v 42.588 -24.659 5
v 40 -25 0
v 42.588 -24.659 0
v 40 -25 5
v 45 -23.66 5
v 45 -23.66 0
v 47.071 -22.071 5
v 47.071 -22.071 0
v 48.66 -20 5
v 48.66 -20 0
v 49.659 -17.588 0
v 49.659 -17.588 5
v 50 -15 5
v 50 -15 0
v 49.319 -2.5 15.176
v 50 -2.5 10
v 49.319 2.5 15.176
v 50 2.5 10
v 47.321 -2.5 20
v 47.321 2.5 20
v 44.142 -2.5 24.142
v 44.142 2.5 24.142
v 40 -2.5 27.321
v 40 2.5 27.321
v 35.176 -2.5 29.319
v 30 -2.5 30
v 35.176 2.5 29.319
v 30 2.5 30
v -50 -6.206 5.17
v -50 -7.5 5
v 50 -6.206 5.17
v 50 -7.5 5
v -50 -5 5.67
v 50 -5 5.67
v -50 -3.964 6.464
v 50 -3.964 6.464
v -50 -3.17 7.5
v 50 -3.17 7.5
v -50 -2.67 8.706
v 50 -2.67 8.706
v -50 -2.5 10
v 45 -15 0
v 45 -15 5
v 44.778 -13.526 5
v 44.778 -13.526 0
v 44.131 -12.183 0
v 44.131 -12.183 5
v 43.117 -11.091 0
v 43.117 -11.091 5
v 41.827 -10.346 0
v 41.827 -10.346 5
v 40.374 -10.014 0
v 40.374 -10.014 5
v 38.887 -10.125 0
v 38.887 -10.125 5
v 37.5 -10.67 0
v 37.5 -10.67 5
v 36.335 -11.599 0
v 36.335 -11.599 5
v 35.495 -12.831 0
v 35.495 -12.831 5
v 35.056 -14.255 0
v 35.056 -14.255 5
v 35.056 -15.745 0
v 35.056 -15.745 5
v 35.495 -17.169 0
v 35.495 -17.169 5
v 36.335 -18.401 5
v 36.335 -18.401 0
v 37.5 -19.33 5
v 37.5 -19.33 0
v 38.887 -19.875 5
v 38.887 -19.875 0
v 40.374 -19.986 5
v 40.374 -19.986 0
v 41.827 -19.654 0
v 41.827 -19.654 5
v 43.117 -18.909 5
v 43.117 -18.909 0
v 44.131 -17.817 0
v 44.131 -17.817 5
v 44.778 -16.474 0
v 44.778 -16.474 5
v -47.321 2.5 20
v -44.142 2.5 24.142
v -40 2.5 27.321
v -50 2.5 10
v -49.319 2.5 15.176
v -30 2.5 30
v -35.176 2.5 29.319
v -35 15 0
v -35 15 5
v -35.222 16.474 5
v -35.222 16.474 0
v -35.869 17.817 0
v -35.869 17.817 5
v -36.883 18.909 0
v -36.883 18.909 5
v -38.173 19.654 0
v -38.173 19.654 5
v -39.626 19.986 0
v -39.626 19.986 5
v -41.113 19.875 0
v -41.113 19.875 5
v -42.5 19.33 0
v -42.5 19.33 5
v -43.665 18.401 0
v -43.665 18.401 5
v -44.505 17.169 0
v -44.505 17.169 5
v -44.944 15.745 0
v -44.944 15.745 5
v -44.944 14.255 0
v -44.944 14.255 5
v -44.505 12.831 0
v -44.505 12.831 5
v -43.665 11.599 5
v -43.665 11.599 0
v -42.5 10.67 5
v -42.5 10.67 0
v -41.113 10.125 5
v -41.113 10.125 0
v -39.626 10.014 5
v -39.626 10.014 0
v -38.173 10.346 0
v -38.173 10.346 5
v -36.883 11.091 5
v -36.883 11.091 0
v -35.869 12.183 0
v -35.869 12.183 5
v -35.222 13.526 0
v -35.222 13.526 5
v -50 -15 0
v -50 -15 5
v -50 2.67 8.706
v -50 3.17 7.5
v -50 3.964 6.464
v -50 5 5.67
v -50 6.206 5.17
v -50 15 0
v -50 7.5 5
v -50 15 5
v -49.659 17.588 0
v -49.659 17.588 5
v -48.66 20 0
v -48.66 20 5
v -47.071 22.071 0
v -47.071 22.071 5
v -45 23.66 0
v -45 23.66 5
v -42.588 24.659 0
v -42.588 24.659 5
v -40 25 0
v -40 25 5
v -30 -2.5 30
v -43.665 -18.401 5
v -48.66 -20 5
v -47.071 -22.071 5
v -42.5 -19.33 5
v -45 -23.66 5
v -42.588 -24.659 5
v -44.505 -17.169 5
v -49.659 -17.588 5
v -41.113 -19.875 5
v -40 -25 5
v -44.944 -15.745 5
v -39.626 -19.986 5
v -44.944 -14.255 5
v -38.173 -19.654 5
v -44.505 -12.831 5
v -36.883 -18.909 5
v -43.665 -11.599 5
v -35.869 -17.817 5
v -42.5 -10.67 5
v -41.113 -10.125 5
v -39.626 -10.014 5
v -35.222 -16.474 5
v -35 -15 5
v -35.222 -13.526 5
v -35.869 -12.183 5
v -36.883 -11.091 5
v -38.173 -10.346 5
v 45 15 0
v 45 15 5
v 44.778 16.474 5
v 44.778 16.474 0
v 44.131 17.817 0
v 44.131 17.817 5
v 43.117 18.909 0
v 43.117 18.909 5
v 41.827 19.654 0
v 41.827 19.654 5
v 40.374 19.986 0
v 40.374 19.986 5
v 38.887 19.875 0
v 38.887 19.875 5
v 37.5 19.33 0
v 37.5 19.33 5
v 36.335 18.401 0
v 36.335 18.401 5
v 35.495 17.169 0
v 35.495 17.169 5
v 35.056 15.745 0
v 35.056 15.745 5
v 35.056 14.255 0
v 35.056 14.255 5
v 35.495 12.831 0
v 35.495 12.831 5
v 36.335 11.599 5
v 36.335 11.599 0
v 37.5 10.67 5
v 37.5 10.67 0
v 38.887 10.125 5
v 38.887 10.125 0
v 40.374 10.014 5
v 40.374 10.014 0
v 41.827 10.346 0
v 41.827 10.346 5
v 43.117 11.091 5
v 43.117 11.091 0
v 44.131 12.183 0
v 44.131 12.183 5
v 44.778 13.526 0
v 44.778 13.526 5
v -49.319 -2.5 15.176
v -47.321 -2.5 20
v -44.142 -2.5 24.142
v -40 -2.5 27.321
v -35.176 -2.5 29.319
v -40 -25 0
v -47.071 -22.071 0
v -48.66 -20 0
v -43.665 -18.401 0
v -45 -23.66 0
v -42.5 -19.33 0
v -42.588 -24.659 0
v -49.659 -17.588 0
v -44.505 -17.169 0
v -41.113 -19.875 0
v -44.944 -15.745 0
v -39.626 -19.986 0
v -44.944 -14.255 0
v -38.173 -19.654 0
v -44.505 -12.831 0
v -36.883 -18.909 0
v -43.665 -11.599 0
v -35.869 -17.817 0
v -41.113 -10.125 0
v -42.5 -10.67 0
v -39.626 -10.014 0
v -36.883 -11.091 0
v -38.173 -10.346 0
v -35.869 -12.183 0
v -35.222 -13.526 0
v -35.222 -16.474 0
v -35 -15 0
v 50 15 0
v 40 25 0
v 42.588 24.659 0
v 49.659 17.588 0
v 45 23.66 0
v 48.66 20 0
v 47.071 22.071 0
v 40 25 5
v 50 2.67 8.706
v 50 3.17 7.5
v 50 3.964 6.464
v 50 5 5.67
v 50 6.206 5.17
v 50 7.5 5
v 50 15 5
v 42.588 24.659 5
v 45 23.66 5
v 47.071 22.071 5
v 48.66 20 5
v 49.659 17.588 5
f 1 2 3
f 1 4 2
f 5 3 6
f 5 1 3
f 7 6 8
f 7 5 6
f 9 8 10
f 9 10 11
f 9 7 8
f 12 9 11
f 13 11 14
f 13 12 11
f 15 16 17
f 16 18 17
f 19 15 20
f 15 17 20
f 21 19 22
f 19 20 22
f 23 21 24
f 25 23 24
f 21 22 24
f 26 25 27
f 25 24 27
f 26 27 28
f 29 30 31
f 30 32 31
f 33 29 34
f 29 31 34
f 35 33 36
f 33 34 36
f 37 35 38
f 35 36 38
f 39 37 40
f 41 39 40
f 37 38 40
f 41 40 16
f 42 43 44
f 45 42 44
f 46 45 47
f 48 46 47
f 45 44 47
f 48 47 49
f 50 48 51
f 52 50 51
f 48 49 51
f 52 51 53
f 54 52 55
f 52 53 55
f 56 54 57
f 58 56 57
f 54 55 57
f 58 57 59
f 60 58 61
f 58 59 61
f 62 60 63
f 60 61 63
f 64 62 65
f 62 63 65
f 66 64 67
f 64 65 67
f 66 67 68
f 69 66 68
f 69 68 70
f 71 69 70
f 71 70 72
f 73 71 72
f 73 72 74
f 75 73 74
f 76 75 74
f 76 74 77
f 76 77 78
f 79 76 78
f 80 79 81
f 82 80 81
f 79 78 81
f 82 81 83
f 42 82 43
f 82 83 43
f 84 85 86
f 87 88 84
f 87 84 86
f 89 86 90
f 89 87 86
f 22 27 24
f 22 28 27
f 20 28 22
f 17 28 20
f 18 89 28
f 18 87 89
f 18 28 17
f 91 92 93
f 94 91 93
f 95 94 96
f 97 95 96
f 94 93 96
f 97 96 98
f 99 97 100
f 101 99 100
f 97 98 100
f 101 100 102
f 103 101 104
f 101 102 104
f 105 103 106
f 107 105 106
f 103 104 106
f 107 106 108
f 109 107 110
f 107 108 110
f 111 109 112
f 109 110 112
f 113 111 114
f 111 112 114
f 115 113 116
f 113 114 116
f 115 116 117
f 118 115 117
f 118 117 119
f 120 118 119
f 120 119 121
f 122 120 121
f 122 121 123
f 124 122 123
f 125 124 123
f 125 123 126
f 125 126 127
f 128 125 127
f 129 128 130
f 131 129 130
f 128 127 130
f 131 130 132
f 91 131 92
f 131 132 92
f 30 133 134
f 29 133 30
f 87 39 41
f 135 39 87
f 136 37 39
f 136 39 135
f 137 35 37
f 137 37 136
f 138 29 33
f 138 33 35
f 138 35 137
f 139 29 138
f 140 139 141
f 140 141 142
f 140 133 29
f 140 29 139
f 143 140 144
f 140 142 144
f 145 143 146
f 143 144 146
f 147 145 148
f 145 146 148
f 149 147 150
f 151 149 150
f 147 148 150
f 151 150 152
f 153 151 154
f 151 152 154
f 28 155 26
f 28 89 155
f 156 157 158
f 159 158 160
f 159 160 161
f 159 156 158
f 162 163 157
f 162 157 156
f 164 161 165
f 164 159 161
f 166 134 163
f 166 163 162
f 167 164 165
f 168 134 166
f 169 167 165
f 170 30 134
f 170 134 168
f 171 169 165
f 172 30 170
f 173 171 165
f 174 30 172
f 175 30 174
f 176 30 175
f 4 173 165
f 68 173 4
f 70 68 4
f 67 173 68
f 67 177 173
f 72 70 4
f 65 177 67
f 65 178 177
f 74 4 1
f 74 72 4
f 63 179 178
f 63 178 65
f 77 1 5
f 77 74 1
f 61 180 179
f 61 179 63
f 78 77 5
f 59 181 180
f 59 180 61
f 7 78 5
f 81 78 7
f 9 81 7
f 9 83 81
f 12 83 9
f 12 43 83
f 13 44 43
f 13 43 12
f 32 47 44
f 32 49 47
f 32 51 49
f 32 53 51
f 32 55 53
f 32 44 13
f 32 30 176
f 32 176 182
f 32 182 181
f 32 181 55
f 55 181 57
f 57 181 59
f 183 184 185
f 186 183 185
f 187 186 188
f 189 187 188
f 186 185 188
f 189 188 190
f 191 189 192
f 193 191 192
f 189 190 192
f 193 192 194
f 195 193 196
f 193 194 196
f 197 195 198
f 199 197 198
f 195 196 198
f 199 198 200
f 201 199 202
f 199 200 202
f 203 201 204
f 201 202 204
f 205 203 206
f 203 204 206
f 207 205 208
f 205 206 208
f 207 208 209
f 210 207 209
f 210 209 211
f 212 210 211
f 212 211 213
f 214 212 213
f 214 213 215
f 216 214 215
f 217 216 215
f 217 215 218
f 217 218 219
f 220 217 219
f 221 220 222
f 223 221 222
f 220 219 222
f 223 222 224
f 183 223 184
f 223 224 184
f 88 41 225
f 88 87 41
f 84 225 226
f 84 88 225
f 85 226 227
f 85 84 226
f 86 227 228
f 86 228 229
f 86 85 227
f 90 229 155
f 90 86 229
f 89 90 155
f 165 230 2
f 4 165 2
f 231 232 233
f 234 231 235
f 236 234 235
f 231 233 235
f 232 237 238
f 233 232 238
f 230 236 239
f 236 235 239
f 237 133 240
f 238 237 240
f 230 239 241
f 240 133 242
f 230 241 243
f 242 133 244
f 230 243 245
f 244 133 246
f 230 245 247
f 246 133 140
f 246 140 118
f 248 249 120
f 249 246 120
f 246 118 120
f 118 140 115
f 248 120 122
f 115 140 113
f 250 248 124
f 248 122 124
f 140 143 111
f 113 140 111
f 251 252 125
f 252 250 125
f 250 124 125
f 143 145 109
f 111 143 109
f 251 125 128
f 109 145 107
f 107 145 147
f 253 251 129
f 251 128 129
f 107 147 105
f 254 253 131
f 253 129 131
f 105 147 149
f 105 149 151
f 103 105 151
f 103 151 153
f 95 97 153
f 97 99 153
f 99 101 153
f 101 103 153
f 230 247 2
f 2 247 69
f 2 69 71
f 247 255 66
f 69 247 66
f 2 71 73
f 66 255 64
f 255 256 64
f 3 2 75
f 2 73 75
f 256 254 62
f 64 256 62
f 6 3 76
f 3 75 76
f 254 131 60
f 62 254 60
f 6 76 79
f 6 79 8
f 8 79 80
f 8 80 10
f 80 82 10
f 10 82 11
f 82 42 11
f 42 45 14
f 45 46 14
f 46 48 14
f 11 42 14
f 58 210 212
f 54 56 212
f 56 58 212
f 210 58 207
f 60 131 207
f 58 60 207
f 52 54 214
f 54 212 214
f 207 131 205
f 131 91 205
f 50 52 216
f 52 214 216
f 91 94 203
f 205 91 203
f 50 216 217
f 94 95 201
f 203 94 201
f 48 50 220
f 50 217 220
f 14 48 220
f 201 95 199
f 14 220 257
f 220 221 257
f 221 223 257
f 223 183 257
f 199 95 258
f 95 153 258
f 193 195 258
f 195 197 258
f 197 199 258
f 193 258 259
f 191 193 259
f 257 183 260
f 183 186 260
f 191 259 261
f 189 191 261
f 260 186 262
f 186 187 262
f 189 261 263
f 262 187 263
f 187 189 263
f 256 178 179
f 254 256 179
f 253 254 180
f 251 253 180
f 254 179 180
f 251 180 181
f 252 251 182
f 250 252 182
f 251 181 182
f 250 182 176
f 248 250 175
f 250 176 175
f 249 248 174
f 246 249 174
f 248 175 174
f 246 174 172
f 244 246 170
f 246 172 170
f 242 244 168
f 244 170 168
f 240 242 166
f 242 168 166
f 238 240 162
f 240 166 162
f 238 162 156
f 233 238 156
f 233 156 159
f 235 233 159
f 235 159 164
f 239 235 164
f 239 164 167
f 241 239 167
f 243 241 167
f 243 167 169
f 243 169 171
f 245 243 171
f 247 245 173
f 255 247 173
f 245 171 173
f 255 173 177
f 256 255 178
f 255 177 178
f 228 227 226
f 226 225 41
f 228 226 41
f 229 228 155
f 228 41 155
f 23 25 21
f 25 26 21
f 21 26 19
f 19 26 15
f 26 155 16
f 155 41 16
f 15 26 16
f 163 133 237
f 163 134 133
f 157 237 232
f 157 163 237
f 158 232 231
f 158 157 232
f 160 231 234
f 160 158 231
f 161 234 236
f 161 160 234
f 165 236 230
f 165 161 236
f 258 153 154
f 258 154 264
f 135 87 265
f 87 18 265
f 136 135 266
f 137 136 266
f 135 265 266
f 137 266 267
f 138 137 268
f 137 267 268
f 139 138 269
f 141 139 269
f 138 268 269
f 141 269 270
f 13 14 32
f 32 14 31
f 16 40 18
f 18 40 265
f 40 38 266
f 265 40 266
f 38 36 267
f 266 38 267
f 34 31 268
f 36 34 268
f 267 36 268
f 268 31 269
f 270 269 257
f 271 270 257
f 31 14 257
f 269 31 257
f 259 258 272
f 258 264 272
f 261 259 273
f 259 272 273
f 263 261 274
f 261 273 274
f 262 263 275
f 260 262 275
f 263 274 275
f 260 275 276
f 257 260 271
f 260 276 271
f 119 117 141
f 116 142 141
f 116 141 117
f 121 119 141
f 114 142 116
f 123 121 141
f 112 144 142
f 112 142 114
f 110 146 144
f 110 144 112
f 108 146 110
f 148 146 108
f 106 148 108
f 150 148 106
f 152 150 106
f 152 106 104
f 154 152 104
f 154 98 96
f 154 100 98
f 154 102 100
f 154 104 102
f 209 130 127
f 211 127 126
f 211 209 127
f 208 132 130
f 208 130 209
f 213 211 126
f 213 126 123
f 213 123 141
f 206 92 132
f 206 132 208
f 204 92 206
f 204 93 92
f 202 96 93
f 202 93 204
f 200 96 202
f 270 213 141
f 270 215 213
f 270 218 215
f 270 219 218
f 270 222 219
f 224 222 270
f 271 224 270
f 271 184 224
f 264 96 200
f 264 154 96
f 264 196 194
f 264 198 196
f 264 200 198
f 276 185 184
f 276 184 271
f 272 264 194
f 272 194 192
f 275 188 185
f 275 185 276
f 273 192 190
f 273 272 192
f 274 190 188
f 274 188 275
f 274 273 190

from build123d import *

# Parameters (mm, degrees)
SKETCH_W     = 100
SKETCH_H     = 50
PAD_DEPTH    = 5
SKETCH001_R  = 5
POCKET_DEPTH = 5
SKETCH002_W  = 100
SKETCH002_H  = 5
PAD001_DEPTH = 25
FILLET_R     = 20
FILLET001_R  = 10
FILLET002_R  = 5


with BuildPart() as part:
    # Sketch → Pad (new body)
    with BuildSketch(Plane.XY):
        Rectangle(SKETCH_W, SKETCH_H)
    extrude(amount=PAD_DEPTH)

    # Sketch001 (on Face6 of Pad) → Pocket (cut)
    with BuildSketch(Plane.XY.offset(5)):
        with Locations((40, 15)):
            Circle(SKETCH001_R)
        with Locations((40, -15)):
            Circle(SKETCH001_R)
        with Locations((-40, 15)):
            Circle(SKETCH001_R)
        with Locations((-40, -15)):
            Circle(SKETCH001_R)
    extrude(amount=-POCKET_DEPTH, mode=Mode.SUBTRACT)

    # Sketch002 (on Face5 of Pocket) → Pad001 (join)
    with BuildSketch(Plane.XY.offset(5)):
        Rectangle(SKETCH002_W, SKETCH002_H)
    extrude(amount=PAD001_DEPTH)

    # Fillet
    fillet_edges = [part.edges().sort_by_distance(p)[0] for p in [
        (50, 0, 30),
        (-50, 0, 30),
    ]]
    fillet(fillet_edges, radius=FILLET_R)

    # Fillet001
    fillet001_edges = [part.edges().sort_by_distance(p)[0] for p in [
        (50, -25, 2.5),
        (-50, -25, 2.5),
        (-50, 25, 2.5),
        (50, 25, 2.5),
    ]]
    fillet(fillet001_edges, radius=FILLET001_R)

    # Fillet002
    fillet002_edges = [part.edges().sort_by_distance(p)[0] for p in [
        (0, -2.5, 5),
        (0, 2.5, 5),
    ]]
    fillet(fillet002_edges, radius=FILLET002_R)


solid = part.part
